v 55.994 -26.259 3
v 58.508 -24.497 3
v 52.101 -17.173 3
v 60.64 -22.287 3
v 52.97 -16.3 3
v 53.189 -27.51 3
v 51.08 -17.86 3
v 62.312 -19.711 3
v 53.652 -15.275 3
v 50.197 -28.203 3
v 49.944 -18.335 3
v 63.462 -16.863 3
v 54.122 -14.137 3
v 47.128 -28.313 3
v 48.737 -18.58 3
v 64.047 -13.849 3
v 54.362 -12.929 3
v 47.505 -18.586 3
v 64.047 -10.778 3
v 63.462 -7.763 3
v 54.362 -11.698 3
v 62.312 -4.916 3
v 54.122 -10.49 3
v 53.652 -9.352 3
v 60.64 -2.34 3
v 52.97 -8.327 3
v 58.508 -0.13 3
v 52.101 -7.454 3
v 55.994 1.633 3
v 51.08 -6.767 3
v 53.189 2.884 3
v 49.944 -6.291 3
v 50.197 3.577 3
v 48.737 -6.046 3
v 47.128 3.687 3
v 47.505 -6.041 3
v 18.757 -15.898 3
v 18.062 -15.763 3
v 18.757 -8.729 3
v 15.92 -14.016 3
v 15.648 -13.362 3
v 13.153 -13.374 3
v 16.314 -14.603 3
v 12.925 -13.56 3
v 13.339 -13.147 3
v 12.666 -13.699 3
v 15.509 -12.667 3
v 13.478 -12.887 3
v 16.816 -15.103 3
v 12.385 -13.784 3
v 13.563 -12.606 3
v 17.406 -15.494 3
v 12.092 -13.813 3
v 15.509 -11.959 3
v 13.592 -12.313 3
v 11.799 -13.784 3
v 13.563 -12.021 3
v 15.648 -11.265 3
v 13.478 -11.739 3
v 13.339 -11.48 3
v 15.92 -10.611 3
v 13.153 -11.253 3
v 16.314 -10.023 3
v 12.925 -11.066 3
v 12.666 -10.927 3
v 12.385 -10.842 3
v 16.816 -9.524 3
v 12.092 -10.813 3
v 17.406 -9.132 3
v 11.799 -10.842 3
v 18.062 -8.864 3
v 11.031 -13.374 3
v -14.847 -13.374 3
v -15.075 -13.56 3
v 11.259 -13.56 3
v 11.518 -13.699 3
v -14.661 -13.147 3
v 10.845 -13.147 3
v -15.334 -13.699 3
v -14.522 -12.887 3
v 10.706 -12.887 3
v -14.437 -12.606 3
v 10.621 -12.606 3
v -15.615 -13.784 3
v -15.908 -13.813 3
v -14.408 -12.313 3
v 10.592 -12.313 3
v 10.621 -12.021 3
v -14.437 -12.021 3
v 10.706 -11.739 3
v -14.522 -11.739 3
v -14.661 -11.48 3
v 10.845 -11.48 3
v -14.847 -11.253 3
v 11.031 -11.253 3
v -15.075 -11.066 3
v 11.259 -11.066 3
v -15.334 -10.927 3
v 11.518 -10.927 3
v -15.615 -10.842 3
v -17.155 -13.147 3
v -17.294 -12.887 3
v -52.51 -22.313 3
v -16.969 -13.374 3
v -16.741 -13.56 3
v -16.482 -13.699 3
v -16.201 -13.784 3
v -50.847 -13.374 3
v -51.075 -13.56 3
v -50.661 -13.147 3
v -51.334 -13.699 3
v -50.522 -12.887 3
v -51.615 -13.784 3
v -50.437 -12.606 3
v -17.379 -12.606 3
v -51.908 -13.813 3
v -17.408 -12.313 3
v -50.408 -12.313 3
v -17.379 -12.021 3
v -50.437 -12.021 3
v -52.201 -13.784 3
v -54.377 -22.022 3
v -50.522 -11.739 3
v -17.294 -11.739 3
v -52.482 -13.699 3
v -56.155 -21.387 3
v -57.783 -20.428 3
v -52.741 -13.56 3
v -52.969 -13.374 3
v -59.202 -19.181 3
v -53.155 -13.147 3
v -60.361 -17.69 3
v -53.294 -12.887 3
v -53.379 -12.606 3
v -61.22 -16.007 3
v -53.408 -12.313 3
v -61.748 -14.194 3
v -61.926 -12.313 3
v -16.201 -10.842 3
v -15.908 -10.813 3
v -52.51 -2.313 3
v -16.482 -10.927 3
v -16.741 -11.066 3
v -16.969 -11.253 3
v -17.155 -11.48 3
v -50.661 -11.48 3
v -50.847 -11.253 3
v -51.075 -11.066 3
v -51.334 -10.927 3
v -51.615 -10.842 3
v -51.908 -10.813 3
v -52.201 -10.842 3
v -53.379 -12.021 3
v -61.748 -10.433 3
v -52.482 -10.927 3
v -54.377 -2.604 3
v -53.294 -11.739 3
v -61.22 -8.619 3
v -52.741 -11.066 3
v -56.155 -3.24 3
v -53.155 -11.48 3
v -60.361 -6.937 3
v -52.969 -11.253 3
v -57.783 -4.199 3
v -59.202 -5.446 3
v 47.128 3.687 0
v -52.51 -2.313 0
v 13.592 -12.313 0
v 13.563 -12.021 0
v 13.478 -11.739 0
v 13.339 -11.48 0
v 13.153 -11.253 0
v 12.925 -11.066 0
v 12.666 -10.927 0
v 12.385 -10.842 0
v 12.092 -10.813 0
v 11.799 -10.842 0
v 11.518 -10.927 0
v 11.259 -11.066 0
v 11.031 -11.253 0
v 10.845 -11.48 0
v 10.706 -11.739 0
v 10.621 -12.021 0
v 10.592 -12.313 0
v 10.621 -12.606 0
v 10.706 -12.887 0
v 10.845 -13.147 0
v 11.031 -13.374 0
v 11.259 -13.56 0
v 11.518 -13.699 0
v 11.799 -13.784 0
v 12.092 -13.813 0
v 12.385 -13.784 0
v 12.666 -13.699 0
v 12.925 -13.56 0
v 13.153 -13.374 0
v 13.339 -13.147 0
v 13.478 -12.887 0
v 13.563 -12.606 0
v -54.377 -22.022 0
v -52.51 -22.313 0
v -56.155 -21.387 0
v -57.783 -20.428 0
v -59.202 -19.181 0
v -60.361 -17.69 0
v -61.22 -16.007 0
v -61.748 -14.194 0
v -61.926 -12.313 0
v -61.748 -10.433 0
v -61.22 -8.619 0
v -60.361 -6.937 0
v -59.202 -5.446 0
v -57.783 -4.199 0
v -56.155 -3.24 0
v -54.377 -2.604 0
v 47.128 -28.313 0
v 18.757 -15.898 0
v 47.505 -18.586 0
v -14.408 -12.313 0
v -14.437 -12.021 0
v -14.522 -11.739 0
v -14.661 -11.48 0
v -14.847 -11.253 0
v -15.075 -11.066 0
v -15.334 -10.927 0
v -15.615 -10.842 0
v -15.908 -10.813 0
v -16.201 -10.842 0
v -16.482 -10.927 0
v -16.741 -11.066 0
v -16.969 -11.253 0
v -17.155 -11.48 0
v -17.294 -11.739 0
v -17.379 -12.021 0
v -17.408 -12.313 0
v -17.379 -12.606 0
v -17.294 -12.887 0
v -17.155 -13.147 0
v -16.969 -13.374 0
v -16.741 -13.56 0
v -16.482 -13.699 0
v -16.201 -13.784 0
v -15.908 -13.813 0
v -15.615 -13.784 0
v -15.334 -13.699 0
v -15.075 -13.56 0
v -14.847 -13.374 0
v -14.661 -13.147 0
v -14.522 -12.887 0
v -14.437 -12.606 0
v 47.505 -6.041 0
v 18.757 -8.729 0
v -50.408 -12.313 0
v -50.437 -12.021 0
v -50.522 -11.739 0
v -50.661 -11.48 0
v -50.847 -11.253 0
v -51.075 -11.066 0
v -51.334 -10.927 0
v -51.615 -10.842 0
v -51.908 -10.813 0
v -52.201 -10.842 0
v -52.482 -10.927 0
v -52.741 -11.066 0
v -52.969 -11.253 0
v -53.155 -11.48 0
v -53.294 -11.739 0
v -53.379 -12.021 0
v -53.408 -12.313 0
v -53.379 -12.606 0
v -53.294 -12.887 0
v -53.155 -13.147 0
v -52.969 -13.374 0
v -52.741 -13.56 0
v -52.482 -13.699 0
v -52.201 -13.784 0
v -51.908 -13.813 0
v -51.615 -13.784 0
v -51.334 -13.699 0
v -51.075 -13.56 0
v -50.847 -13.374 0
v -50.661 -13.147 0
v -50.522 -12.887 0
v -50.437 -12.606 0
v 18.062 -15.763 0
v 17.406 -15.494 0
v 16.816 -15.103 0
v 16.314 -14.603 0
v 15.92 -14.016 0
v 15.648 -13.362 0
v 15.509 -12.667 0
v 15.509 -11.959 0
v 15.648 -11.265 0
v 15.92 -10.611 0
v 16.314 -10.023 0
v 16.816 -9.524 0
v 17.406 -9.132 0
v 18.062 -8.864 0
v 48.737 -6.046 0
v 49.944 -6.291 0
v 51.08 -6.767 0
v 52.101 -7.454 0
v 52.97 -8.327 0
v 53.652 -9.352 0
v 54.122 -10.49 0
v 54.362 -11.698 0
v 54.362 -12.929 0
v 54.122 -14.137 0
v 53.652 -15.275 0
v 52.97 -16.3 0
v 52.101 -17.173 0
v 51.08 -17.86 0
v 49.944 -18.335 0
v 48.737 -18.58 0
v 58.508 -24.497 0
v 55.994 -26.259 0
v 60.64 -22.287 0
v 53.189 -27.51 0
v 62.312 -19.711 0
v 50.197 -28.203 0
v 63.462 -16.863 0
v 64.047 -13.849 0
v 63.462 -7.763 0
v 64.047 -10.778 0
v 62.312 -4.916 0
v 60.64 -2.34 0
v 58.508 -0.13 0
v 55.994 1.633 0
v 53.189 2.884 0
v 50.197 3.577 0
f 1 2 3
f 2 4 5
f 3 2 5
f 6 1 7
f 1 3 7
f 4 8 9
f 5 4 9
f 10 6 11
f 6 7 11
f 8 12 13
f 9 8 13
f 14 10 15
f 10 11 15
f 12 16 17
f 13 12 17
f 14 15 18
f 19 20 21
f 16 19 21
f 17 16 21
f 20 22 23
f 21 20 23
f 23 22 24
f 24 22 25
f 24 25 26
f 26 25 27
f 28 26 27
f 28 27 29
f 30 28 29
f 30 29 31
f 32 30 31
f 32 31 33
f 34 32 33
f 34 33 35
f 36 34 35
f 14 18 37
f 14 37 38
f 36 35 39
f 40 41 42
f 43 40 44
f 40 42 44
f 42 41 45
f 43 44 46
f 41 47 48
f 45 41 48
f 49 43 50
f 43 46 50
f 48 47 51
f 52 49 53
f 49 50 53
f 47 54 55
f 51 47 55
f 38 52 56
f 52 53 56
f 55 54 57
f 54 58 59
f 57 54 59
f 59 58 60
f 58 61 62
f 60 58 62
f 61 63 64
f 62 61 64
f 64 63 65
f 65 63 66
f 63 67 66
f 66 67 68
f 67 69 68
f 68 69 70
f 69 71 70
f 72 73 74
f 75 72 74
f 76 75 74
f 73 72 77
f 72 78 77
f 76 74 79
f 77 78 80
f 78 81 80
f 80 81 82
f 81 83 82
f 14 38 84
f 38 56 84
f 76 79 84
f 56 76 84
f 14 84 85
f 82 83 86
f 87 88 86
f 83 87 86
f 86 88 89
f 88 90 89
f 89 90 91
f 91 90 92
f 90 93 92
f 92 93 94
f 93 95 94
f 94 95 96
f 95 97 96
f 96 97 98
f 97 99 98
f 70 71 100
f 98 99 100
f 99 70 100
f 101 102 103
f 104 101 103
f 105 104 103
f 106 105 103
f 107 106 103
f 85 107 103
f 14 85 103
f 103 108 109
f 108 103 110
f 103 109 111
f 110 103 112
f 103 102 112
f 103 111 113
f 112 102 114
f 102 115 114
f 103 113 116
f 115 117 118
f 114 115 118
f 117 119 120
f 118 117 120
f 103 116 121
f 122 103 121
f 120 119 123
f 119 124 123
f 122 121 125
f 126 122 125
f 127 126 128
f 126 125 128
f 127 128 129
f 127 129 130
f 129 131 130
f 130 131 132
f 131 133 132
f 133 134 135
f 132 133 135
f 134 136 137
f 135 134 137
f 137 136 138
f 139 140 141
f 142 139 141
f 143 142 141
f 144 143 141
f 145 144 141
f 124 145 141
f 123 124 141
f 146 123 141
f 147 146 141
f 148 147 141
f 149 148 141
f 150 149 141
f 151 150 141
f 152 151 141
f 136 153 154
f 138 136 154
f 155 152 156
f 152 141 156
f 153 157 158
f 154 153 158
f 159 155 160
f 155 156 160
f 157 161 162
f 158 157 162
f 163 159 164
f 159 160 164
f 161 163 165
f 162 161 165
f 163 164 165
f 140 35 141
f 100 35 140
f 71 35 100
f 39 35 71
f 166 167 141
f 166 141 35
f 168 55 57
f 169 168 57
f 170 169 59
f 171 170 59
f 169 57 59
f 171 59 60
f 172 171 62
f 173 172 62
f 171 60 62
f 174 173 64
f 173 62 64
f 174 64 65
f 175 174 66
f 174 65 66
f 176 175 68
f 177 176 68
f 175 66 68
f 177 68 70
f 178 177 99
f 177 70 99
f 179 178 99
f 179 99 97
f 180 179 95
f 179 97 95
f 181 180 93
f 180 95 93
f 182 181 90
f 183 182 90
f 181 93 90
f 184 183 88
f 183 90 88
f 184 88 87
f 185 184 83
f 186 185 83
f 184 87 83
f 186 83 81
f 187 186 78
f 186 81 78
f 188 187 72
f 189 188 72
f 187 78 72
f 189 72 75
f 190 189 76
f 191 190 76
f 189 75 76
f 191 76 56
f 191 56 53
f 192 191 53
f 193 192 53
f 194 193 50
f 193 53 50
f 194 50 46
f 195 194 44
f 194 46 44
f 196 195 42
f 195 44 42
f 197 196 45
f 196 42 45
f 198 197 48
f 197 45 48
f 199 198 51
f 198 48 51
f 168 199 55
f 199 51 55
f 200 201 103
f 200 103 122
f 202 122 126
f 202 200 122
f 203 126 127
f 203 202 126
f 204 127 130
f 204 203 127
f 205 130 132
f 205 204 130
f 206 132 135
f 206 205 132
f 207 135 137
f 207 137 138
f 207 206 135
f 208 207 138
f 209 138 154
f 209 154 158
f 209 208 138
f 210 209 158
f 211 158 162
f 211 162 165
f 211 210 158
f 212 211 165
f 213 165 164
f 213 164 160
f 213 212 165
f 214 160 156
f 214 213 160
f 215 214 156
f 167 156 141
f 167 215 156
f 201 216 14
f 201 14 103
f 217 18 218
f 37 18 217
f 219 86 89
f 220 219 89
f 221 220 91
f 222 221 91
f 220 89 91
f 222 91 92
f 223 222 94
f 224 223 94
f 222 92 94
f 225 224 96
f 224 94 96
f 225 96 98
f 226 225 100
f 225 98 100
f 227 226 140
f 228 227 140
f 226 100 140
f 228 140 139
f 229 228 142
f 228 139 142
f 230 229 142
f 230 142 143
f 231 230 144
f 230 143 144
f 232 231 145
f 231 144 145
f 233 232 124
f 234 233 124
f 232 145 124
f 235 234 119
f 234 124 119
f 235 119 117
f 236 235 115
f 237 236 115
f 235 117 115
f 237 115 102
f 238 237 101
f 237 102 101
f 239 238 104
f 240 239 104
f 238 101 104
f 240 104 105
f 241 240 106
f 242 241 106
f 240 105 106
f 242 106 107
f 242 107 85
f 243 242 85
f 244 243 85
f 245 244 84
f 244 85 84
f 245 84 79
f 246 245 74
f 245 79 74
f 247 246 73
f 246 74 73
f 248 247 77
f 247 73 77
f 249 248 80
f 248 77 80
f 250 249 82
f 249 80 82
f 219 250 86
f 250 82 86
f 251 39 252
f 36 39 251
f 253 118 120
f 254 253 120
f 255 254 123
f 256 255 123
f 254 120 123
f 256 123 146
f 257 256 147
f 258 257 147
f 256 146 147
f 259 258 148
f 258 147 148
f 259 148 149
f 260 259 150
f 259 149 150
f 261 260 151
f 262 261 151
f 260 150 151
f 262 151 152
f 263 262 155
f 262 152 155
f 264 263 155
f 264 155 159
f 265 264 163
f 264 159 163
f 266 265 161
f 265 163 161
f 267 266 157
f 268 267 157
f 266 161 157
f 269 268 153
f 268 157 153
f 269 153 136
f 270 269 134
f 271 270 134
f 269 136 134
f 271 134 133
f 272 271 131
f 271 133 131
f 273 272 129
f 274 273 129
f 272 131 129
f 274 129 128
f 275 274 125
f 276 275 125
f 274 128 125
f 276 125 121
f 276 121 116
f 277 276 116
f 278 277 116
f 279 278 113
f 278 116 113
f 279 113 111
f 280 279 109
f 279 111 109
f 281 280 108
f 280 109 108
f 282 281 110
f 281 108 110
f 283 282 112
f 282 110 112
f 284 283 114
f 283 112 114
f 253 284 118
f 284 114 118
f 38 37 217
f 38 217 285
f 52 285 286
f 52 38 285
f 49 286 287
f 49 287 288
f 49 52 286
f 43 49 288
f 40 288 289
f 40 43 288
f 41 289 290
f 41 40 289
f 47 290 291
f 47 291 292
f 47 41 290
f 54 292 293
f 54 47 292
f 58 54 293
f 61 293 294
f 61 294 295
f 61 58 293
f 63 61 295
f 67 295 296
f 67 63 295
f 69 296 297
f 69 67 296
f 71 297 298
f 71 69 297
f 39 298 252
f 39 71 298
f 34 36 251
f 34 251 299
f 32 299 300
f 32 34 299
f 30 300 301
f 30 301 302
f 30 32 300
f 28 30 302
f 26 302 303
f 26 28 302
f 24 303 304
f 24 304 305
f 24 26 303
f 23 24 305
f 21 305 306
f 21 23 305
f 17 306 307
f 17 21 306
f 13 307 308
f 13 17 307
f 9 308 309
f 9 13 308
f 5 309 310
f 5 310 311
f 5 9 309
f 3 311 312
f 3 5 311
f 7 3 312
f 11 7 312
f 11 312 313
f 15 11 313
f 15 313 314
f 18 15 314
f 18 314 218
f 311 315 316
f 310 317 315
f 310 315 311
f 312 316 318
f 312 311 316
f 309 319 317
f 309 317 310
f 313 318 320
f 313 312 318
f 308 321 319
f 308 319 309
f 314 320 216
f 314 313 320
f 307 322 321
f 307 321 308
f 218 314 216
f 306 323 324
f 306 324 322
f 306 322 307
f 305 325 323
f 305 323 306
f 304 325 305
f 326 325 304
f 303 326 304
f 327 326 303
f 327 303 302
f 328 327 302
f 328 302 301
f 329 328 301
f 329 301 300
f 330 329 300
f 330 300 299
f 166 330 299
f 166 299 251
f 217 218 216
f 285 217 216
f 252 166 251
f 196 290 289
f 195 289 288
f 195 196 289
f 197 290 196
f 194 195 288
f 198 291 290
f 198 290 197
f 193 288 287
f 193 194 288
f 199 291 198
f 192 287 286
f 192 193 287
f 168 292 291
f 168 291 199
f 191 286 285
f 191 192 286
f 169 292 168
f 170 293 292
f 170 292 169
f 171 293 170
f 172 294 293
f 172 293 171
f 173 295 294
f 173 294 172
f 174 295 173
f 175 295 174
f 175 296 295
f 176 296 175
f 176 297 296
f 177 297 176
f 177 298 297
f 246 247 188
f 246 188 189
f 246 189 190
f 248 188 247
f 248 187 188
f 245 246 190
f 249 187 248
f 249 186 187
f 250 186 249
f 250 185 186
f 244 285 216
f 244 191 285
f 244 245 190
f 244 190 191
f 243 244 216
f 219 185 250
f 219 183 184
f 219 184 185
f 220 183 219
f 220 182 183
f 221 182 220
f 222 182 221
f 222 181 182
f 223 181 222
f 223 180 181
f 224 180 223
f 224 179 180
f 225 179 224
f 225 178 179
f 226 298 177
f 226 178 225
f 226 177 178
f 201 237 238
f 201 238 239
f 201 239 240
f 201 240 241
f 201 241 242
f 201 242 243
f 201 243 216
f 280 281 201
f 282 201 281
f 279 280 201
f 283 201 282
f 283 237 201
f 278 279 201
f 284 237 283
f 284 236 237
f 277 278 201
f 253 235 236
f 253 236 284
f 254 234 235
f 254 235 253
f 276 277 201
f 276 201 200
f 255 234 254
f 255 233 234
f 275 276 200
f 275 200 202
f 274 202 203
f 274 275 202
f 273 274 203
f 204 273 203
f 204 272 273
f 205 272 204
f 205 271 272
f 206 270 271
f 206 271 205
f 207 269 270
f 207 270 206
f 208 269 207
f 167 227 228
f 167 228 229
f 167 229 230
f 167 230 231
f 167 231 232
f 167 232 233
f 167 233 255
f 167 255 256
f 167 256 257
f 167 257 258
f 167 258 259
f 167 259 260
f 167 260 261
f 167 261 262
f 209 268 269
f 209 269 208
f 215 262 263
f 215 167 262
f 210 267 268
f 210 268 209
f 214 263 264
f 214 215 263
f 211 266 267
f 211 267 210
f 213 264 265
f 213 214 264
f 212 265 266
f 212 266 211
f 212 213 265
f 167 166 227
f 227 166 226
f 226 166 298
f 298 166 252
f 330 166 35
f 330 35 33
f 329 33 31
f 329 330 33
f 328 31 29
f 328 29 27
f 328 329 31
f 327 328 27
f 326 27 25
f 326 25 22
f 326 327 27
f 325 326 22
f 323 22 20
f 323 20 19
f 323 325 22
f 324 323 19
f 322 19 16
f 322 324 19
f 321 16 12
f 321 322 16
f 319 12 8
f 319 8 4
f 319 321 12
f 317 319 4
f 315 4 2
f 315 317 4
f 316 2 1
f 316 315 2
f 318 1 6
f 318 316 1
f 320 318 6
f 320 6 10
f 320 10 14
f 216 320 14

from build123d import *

# Parameters (mm, degrees)
BOSS_EXTRUDE1_DEPTH = 3
SKETCH2_R           = 1.5
CUT_EXTRUDE1_DEPTH  = 3


with BuildPart() as part:
    # Sketch1 → Boss-Extrude1 (new body)
    with BuildSketch(Plane.XY):
        with BuildLine():
            Line((-52.51020312, -2.31327399), (47.128491464, 3.68672601))
            ThreePointArc((47.128491464, 3.68672601), (64.120955569, -12.31327399), (47.128491464, -28.31327399))
            Line((47.128491464, -28.31327399), (-52.51020312, -22.31327399))
            ThreePointArc((-52.51020312, -22.31327399), (-61.926141798, -12.31327399), (-52.51020312, -2.31327399))
        make_face()
    extrude(amount=BOSS_EXTRUDE1_DEPTH)

    # Sketch2 → Cut-Extrude1 (cut)
    with BuildSketch(Plane.XY.offset(3)):
        with Locations((12.091972574, -12.31327399)):
            Circle(SKETCH2_R)
        with Locations((-15.908027426, -12.31327399)):
            Circle(SKETCH2_R)
        with Locations((-51.908027426, -12.31327399)):
            Circle(SKETCH2_R)
        with BuildLine():
            Line((18.75680016, -8.728910804), (47.50542085, -6.040638414))
            ThreePointArc((47.50542085, -6.040638414), (54.391972574, -12.31327399), (47.50542085, -18.585909567))
            Line((47.50542085, -18.585909567), (18.75680016, -15.897637177))
            ThreePointArc((18.75680016, -15.897637177), (15.491972574, -12.31327399), (18.75680016, -8.728910804))
        make_face()
    extrude(amount=-CUT_EXTRUDE1_DEPTH, mode=Mode.SUBTRACT)


solid = part.part
